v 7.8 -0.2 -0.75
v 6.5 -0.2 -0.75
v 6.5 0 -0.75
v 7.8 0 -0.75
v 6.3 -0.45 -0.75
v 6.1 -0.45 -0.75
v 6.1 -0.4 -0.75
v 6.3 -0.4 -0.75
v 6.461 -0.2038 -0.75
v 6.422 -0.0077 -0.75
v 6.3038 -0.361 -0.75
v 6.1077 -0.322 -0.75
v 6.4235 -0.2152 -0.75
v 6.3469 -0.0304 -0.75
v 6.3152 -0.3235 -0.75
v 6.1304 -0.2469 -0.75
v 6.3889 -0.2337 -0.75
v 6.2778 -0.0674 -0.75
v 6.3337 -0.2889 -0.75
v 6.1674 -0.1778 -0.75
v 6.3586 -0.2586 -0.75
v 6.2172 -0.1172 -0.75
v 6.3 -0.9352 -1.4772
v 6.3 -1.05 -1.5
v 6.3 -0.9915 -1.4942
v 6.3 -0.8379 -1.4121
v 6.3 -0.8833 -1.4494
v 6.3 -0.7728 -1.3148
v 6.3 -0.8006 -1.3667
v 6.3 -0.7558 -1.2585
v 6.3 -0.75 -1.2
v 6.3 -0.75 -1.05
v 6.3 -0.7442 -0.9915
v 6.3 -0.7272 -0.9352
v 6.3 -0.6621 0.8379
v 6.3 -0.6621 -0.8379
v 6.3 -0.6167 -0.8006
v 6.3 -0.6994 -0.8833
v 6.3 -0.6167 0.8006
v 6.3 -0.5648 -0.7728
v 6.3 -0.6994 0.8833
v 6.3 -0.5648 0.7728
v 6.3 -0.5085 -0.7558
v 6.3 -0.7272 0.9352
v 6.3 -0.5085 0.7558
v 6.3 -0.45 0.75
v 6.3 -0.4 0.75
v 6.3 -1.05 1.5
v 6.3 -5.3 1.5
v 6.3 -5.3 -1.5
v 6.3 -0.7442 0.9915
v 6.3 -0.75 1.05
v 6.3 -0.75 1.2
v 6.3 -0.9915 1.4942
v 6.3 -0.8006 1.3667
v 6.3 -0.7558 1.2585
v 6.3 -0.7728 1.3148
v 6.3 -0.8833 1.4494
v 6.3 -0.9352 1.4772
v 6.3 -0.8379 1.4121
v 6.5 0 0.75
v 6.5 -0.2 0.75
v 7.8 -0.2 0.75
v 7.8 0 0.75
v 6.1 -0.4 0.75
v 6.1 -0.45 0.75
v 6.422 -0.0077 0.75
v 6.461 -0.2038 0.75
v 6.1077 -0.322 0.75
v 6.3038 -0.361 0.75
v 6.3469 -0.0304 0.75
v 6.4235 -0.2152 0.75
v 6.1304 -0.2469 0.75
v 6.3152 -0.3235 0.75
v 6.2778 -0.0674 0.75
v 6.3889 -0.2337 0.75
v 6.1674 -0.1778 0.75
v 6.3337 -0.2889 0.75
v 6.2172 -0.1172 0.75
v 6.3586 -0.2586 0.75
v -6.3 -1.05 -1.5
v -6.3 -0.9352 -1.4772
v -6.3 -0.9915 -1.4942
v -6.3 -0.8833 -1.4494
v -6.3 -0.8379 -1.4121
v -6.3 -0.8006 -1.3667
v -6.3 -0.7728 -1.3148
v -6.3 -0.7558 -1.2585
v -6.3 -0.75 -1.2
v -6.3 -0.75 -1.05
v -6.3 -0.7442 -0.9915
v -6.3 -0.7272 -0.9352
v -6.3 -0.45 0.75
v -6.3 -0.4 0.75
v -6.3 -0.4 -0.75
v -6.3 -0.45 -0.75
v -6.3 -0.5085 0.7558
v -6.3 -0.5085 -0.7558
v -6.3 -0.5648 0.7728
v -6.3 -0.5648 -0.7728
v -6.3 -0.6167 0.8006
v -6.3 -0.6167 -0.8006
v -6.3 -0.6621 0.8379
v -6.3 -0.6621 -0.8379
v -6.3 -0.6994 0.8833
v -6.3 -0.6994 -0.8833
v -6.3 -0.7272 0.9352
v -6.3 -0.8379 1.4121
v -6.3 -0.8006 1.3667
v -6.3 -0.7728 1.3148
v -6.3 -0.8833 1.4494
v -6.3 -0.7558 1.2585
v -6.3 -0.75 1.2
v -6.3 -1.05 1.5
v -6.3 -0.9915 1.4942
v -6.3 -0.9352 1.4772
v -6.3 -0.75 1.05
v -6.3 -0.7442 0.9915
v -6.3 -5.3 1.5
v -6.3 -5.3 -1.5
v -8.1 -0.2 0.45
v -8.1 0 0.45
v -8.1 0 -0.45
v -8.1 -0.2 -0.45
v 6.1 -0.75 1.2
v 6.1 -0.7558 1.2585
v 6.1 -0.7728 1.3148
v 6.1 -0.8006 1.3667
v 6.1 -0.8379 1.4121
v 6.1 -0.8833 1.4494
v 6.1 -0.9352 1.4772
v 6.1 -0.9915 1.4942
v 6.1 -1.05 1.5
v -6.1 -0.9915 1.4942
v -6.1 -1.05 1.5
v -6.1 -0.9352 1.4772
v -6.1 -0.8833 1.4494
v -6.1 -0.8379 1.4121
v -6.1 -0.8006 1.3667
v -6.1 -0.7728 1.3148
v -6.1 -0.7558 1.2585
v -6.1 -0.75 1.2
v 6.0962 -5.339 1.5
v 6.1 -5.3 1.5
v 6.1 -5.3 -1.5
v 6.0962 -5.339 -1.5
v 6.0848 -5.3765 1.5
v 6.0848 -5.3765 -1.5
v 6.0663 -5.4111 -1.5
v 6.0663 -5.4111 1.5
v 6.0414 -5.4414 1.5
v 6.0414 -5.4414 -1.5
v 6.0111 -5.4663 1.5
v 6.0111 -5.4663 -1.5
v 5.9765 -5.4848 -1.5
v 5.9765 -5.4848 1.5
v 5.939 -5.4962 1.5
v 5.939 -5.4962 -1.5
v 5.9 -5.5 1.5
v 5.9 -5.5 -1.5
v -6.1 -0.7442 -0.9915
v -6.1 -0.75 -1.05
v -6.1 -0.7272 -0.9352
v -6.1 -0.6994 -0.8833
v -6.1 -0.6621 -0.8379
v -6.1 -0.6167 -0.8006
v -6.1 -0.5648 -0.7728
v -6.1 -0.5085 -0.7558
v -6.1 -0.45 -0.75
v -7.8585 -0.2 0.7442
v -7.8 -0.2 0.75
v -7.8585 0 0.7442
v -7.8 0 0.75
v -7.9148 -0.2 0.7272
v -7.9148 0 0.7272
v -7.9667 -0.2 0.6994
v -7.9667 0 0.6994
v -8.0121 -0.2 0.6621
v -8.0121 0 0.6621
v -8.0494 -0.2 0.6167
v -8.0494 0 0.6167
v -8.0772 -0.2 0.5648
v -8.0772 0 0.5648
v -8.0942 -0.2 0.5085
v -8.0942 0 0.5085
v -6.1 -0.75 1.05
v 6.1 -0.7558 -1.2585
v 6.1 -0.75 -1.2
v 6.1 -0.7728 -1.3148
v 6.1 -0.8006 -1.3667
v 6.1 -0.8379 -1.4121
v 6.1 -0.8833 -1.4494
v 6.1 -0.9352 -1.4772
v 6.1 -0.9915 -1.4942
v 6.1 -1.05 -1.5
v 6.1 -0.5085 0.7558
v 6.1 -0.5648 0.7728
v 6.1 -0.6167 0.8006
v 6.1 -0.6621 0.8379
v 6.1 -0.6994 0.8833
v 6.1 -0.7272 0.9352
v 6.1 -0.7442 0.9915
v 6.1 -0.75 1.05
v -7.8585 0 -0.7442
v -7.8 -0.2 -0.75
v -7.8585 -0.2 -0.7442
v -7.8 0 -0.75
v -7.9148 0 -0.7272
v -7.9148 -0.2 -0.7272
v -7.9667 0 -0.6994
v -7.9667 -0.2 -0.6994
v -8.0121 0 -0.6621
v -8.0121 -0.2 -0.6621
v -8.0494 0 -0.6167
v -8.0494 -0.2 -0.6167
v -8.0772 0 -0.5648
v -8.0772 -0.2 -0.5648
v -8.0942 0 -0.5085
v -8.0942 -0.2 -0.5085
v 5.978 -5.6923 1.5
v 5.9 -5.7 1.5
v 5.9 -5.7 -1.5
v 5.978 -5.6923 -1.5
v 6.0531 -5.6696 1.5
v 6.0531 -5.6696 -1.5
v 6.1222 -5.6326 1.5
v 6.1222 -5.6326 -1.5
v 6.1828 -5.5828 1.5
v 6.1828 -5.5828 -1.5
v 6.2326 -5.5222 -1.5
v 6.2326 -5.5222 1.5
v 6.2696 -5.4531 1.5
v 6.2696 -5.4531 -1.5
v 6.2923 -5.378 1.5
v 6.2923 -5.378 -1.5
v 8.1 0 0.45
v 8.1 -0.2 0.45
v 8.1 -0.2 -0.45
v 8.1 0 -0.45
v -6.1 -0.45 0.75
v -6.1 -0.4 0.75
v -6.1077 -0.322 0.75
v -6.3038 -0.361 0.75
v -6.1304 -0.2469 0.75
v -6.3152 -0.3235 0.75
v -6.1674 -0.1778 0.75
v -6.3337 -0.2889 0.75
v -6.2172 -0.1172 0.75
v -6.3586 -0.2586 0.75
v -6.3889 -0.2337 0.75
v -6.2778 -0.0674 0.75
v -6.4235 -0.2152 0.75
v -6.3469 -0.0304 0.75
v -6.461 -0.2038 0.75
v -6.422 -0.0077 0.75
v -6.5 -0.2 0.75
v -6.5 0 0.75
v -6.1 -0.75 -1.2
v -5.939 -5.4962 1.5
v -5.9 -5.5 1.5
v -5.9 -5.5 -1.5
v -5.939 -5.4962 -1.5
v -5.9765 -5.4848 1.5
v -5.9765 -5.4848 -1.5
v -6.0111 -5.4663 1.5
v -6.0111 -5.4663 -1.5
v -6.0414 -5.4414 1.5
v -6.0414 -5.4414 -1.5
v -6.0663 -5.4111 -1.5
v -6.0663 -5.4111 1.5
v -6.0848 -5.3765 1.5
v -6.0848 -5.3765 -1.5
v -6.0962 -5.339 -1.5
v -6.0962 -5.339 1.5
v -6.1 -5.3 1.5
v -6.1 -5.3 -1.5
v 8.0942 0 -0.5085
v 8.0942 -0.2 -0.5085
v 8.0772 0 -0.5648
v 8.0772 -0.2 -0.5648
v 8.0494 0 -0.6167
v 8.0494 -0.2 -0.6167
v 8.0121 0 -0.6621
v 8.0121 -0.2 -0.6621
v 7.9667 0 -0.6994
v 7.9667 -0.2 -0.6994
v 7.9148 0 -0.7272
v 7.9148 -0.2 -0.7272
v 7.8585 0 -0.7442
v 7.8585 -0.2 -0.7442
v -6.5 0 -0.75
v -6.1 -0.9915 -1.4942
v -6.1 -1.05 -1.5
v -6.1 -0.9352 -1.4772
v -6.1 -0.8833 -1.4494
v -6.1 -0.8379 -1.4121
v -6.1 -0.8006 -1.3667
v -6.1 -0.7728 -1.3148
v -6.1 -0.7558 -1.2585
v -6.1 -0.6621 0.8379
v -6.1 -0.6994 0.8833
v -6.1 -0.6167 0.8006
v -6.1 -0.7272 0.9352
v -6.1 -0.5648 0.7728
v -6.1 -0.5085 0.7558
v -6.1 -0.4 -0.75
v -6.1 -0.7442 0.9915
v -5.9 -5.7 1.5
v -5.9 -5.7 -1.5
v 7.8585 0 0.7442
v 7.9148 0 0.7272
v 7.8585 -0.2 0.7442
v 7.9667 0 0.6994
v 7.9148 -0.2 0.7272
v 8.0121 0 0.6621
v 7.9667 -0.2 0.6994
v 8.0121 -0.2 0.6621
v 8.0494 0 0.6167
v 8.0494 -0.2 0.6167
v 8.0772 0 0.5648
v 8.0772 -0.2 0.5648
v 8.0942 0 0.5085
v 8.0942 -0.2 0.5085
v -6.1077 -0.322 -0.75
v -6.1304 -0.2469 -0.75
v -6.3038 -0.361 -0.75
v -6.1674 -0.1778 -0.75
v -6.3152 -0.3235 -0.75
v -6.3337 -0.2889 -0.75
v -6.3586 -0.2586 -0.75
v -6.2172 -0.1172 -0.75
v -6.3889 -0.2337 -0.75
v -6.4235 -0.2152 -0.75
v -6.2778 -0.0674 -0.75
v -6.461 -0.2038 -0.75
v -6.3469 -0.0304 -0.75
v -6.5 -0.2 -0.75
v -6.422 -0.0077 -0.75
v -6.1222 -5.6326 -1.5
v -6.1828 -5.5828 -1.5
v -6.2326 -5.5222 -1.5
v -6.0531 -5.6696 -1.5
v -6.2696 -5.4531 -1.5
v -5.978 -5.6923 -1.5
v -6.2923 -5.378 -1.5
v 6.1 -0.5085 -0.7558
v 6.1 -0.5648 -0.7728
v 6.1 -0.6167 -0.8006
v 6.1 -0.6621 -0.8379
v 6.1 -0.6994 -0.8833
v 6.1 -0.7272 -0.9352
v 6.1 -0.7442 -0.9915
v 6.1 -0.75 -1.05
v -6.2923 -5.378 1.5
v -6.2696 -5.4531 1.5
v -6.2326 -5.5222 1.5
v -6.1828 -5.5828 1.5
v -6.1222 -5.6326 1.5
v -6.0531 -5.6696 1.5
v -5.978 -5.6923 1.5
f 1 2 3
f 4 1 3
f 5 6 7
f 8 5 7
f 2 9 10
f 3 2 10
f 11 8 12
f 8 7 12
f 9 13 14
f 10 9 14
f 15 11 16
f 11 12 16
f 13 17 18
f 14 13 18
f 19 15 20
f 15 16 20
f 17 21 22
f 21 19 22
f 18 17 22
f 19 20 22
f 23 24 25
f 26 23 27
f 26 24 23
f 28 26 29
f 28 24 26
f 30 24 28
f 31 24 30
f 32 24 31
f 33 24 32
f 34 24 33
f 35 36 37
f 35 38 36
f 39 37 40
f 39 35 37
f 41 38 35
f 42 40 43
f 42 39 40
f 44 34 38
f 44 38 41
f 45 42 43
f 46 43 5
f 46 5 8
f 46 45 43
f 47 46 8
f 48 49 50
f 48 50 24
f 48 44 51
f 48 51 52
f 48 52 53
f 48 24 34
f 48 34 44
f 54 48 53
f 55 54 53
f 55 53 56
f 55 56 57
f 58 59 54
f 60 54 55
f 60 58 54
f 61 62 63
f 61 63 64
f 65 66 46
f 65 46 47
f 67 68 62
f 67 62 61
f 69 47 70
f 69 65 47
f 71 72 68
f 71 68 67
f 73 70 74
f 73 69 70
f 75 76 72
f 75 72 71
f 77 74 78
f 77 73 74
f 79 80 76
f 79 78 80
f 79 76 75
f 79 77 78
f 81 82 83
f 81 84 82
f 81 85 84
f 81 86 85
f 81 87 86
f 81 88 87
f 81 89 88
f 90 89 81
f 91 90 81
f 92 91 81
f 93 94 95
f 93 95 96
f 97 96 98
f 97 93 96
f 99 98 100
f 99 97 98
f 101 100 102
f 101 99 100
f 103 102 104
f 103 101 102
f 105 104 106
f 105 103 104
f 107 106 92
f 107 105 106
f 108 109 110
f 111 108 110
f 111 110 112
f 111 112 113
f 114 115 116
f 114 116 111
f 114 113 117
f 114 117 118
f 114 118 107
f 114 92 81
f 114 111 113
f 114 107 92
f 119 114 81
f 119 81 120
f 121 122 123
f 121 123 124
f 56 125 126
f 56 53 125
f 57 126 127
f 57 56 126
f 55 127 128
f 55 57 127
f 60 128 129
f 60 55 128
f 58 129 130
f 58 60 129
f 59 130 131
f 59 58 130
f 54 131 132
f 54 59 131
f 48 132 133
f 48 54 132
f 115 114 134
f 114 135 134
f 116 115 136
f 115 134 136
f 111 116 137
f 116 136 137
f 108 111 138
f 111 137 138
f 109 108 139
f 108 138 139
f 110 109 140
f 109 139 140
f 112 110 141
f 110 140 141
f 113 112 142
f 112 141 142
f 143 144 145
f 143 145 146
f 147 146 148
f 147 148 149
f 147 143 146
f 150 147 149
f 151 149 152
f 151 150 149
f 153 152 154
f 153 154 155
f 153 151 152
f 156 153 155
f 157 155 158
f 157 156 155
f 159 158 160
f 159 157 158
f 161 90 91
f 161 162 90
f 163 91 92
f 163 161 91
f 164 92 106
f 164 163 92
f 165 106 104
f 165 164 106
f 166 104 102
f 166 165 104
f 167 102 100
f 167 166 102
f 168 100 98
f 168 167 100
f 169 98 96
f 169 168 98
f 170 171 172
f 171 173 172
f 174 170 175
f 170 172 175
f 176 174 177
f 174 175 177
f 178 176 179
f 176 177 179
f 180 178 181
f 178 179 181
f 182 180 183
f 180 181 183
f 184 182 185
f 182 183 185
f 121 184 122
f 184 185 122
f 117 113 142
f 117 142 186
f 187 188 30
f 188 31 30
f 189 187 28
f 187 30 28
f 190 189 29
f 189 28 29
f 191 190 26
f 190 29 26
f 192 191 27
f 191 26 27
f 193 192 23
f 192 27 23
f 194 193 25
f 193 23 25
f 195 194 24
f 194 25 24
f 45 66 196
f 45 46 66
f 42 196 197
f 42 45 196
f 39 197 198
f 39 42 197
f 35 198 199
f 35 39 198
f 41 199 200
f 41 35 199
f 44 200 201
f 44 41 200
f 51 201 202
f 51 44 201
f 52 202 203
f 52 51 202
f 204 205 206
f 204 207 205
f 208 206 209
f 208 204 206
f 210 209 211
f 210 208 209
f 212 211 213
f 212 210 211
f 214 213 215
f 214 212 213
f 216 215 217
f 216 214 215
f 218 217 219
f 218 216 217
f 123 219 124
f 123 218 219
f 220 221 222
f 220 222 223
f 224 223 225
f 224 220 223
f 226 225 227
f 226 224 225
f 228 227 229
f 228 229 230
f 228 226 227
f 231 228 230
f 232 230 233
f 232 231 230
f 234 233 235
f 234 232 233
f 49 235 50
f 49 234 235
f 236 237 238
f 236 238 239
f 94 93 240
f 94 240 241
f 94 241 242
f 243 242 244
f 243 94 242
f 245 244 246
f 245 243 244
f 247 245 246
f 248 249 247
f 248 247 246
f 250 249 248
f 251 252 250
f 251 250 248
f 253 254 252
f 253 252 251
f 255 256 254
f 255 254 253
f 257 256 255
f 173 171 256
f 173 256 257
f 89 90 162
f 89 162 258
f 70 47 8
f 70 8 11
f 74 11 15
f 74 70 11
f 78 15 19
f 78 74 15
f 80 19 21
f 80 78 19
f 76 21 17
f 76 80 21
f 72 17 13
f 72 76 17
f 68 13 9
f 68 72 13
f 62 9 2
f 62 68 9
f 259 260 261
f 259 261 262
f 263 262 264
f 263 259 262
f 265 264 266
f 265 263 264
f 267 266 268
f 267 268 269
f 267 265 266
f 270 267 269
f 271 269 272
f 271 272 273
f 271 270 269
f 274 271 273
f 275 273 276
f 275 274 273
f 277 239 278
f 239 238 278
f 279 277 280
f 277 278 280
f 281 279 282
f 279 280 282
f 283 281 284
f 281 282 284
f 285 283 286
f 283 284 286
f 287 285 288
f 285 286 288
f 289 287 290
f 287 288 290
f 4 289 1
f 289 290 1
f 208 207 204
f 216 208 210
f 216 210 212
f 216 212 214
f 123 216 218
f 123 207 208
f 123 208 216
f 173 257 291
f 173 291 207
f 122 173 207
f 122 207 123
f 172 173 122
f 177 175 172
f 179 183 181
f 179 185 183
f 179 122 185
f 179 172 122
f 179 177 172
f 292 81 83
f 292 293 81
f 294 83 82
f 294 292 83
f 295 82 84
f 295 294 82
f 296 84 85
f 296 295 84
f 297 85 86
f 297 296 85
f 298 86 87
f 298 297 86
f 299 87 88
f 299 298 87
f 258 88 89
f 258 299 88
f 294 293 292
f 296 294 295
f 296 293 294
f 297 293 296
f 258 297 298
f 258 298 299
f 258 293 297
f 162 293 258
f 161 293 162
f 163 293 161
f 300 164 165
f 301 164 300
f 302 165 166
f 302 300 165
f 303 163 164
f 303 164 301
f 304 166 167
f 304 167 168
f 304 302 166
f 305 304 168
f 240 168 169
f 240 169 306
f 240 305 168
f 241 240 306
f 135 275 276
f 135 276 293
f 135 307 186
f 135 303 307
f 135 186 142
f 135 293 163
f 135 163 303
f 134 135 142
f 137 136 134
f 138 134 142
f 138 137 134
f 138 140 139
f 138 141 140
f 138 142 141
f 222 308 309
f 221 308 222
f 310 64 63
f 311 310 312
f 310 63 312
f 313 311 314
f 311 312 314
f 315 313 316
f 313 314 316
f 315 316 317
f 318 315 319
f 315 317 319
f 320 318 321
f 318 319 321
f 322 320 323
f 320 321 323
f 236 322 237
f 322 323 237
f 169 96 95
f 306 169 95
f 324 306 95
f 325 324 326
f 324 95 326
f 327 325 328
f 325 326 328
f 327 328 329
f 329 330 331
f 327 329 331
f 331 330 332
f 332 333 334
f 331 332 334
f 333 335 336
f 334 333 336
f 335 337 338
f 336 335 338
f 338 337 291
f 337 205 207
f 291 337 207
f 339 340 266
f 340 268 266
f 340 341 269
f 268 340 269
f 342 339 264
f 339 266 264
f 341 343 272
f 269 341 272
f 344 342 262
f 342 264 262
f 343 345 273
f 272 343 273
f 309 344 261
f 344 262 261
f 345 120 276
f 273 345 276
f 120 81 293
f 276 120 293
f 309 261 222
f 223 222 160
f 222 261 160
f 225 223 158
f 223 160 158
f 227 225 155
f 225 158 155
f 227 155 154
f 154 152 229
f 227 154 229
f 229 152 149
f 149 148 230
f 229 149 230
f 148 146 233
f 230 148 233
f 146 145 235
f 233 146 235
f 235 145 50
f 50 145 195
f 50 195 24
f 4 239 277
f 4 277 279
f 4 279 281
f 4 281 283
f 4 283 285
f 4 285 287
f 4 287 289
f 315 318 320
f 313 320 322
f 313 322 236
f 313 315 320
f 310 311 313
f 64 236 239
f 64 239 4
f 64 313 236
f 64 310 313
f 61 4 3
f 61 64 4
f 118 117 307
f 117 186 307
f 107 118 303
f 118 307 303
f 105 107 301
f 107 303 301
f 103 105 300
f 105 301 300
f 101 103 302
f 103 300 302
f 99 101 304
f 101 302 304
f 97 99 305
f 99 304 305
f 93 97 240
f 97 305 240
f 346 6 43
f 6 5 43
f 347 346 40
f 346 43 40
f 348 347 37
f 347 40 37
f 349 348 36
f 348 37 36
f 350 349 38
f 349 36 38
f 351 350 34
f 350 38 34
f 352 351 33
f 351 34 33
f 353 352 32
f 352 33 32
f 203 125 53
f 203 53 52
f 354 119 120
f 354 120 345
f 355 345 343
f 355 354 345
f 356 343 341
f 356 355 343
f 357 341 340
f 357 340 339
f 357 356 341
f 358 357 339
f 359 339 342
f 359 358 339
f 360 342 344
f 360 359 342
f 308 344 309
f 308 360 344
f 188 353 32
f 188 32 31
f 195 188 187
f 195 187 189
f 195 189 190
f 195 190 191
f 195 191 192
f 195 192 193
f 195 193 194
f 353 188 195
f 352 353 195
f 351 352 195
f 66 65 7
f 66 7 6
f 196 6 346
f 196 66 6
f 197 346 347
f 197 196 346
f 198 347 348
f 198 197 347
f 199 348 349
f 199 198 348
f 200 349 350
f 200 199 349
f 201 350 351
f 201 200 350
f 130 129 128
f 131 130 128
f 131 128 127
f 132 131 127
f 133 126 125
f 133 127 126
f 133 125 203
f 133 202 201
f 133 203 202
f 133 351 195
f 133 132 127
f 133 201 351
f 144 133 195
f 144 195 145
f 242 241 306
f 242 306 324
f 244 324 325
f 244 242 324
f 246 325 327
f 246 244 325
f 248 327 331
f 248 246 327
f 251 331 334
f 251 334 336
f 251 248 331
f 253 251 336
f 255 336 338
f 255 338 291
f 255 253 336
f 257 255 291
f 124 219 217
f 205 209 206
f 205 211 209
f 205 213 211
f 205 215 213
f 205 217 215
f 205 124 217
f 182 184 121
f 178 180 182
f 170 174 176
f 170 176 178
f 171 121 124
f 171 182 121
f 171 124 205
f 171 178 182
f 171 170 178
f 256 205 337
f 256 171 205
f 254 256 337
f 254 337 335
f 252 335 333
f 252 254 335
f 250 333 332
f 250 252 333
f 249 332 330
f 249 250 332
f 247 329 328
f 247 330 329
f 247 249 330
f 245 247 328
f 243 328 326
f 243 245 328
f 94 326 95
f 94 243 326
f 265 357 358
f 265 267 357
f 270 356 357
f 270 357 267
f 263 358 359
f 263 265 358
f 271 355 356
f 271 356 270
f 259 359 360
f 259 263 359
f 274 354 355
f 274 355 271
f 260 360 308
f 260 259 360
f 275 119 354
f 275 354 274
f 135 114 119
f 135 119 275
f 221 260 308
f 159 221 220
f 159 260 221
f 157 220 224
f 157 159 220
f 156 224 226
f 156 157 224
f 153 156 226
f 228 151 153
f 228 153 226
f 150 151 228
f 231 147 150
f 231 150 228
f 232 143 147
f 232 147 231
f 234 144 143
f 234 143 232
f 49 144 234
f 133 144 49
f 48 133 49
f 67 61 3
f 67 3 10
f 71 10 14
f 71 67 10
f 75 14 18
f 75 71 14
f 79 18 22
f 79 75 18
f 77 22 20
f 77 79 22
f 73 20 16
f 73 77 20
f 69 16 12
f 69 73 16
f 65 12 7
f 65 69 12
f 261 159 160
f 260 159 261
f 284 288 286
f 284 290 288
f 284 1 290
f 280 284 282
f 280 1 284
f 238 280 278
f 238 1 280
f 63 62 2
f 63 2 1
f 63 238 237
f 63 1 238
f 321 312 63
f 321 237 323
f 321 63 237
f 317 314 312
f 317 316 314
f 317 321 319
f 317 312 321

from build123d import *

# Parameters (mm, degrees)
BASE_FLANGE1_DEPTH      = 1.5
CUT_EXTRUDE1_DEPTH      = 11.017484714
CUT_EXTRUDE1_DEPTH_BACK = 11.017484714
SKETCH6_W               = 0.75
SKETCH6_H               = 3.25
FILLET1_R               = 0.3
FILLET2_R               = 0.3


# Sheet-metal steps are written as plain solids
with BuildPart() as part:
    # Sketch1 → Base-Flange1 (new, symmetric)
    with BuildSketch(Plane.XY):
        with BuildLine():
            Line((8.1, 0), (6.5, 0))
            ThreePointArc((6.5, 0), (6.217157288, -0.117157288), (6.1, -0.4))
            Line((6.1, -0.4), (6.1, -5.3))
            ThreePointArc((6.1, -5.3), (6.041421356, -5.441421356), (5.9, -5.5))
            Line((5.9, -5.5), (-5.9, -5.5))
            ThreePointArc((-5.9, -5.5), (-6.041421356, -5.441421356), (-6.1, -5.3))
            Line((-6.1, -5.3), (-6.1, -0.4))
            ThreePointArc((-6.1, -0.4), (-6.217157288, -0.117157288), (-6.5, 0))
            Line((-6.5, 0), (-8.1, 0))
            Line((-8.1, 0), (-8.1, -0.2))
            Line((-8.1, -0.2), (-6.5, -0.2))
            ThreePointArc((-6.5, -0.2), (-6.358578644, -0.258578644), (-6.3, -0.4))
            Line((-6.3, -0.4), (-6.3, -5.3))
            ThreePointArc((-6.3, -5.3), (-6.182842712, -5.582842712), (-5.9, -5.7))
            Line((-5.9, -5.7), (5.9, -5.7))
            ThreePointArc((5.9, -5.7), (6.182842712, -5.582842712), (6.3, -5.3))
            Line((6.3, -5.3), (6.3, -0.4))
            ThreePointArc((6.3, -0.4), (6.358578644, -0.258578644), (6.5, -0.2))
            Line((6.5, -0.2), (8.1, -0.2))
            Line((8.1, -0.2), (8.1, 0))
        make_face()
    extrude(amount=BASE_FLANGE1_DEPTH, both=True)

    # Sketch6 → Cut-Extrude1 (cut, two sides: drawn at the far end of the back side and taken through both)
    with BuildSketch(Plane(origin=(0, 0, 0), x_dir=(0, 0, -1), z_dir=(1, 0, 0)).offset(-CUT_EXTRUDE1_DEPTH_BACK)):
        with Locations((1.125, 0.875)):
            Rectangle(SKETCH6_W, SKETCH6_H)
        with Locations((-1.125, 0.875)):
            Rectangle(SKETCH6_W, SKETCH6_H)
    extrude(amount=CUT_EXTRUDE1_DEPTH + CUT_EXTRUDE1_DEPTH_BACK, mode=Mode.SUBTRACT)

    # Fillet1
    fillet1_edges = [part.edges().sort_by_distance(p)[0] for p in [
        (6.2, -0.75, -1.5),
        (-6.2, -0.75, -1.5),
        (6.2, -0.75, -0.75),
        (-6.2, -0.75, -0.75),
        (6.2, -0.75, 1.5),
        (-6.2, -0.75, 1.5),
        (6.2, -0.75, 0.75),
        (-6.2, -0.75, 0.75),
    ]]
    fillet(fillet1_edges, radius=FILLET1_R)

    # Fillet2
    fillet2_edges = [part.edges().sort_by_distance(p)[0] for p in [
        (-8.1, -0.1, -0.75),
        (8.1, -0.1, -0.75),
        (8.1, -0.1, 0.75),
        (-8.1, -0.1, 0.75),
    ]]
    fillet(fillet2_edges, radius=FILLET2_R)


solid = part.part
